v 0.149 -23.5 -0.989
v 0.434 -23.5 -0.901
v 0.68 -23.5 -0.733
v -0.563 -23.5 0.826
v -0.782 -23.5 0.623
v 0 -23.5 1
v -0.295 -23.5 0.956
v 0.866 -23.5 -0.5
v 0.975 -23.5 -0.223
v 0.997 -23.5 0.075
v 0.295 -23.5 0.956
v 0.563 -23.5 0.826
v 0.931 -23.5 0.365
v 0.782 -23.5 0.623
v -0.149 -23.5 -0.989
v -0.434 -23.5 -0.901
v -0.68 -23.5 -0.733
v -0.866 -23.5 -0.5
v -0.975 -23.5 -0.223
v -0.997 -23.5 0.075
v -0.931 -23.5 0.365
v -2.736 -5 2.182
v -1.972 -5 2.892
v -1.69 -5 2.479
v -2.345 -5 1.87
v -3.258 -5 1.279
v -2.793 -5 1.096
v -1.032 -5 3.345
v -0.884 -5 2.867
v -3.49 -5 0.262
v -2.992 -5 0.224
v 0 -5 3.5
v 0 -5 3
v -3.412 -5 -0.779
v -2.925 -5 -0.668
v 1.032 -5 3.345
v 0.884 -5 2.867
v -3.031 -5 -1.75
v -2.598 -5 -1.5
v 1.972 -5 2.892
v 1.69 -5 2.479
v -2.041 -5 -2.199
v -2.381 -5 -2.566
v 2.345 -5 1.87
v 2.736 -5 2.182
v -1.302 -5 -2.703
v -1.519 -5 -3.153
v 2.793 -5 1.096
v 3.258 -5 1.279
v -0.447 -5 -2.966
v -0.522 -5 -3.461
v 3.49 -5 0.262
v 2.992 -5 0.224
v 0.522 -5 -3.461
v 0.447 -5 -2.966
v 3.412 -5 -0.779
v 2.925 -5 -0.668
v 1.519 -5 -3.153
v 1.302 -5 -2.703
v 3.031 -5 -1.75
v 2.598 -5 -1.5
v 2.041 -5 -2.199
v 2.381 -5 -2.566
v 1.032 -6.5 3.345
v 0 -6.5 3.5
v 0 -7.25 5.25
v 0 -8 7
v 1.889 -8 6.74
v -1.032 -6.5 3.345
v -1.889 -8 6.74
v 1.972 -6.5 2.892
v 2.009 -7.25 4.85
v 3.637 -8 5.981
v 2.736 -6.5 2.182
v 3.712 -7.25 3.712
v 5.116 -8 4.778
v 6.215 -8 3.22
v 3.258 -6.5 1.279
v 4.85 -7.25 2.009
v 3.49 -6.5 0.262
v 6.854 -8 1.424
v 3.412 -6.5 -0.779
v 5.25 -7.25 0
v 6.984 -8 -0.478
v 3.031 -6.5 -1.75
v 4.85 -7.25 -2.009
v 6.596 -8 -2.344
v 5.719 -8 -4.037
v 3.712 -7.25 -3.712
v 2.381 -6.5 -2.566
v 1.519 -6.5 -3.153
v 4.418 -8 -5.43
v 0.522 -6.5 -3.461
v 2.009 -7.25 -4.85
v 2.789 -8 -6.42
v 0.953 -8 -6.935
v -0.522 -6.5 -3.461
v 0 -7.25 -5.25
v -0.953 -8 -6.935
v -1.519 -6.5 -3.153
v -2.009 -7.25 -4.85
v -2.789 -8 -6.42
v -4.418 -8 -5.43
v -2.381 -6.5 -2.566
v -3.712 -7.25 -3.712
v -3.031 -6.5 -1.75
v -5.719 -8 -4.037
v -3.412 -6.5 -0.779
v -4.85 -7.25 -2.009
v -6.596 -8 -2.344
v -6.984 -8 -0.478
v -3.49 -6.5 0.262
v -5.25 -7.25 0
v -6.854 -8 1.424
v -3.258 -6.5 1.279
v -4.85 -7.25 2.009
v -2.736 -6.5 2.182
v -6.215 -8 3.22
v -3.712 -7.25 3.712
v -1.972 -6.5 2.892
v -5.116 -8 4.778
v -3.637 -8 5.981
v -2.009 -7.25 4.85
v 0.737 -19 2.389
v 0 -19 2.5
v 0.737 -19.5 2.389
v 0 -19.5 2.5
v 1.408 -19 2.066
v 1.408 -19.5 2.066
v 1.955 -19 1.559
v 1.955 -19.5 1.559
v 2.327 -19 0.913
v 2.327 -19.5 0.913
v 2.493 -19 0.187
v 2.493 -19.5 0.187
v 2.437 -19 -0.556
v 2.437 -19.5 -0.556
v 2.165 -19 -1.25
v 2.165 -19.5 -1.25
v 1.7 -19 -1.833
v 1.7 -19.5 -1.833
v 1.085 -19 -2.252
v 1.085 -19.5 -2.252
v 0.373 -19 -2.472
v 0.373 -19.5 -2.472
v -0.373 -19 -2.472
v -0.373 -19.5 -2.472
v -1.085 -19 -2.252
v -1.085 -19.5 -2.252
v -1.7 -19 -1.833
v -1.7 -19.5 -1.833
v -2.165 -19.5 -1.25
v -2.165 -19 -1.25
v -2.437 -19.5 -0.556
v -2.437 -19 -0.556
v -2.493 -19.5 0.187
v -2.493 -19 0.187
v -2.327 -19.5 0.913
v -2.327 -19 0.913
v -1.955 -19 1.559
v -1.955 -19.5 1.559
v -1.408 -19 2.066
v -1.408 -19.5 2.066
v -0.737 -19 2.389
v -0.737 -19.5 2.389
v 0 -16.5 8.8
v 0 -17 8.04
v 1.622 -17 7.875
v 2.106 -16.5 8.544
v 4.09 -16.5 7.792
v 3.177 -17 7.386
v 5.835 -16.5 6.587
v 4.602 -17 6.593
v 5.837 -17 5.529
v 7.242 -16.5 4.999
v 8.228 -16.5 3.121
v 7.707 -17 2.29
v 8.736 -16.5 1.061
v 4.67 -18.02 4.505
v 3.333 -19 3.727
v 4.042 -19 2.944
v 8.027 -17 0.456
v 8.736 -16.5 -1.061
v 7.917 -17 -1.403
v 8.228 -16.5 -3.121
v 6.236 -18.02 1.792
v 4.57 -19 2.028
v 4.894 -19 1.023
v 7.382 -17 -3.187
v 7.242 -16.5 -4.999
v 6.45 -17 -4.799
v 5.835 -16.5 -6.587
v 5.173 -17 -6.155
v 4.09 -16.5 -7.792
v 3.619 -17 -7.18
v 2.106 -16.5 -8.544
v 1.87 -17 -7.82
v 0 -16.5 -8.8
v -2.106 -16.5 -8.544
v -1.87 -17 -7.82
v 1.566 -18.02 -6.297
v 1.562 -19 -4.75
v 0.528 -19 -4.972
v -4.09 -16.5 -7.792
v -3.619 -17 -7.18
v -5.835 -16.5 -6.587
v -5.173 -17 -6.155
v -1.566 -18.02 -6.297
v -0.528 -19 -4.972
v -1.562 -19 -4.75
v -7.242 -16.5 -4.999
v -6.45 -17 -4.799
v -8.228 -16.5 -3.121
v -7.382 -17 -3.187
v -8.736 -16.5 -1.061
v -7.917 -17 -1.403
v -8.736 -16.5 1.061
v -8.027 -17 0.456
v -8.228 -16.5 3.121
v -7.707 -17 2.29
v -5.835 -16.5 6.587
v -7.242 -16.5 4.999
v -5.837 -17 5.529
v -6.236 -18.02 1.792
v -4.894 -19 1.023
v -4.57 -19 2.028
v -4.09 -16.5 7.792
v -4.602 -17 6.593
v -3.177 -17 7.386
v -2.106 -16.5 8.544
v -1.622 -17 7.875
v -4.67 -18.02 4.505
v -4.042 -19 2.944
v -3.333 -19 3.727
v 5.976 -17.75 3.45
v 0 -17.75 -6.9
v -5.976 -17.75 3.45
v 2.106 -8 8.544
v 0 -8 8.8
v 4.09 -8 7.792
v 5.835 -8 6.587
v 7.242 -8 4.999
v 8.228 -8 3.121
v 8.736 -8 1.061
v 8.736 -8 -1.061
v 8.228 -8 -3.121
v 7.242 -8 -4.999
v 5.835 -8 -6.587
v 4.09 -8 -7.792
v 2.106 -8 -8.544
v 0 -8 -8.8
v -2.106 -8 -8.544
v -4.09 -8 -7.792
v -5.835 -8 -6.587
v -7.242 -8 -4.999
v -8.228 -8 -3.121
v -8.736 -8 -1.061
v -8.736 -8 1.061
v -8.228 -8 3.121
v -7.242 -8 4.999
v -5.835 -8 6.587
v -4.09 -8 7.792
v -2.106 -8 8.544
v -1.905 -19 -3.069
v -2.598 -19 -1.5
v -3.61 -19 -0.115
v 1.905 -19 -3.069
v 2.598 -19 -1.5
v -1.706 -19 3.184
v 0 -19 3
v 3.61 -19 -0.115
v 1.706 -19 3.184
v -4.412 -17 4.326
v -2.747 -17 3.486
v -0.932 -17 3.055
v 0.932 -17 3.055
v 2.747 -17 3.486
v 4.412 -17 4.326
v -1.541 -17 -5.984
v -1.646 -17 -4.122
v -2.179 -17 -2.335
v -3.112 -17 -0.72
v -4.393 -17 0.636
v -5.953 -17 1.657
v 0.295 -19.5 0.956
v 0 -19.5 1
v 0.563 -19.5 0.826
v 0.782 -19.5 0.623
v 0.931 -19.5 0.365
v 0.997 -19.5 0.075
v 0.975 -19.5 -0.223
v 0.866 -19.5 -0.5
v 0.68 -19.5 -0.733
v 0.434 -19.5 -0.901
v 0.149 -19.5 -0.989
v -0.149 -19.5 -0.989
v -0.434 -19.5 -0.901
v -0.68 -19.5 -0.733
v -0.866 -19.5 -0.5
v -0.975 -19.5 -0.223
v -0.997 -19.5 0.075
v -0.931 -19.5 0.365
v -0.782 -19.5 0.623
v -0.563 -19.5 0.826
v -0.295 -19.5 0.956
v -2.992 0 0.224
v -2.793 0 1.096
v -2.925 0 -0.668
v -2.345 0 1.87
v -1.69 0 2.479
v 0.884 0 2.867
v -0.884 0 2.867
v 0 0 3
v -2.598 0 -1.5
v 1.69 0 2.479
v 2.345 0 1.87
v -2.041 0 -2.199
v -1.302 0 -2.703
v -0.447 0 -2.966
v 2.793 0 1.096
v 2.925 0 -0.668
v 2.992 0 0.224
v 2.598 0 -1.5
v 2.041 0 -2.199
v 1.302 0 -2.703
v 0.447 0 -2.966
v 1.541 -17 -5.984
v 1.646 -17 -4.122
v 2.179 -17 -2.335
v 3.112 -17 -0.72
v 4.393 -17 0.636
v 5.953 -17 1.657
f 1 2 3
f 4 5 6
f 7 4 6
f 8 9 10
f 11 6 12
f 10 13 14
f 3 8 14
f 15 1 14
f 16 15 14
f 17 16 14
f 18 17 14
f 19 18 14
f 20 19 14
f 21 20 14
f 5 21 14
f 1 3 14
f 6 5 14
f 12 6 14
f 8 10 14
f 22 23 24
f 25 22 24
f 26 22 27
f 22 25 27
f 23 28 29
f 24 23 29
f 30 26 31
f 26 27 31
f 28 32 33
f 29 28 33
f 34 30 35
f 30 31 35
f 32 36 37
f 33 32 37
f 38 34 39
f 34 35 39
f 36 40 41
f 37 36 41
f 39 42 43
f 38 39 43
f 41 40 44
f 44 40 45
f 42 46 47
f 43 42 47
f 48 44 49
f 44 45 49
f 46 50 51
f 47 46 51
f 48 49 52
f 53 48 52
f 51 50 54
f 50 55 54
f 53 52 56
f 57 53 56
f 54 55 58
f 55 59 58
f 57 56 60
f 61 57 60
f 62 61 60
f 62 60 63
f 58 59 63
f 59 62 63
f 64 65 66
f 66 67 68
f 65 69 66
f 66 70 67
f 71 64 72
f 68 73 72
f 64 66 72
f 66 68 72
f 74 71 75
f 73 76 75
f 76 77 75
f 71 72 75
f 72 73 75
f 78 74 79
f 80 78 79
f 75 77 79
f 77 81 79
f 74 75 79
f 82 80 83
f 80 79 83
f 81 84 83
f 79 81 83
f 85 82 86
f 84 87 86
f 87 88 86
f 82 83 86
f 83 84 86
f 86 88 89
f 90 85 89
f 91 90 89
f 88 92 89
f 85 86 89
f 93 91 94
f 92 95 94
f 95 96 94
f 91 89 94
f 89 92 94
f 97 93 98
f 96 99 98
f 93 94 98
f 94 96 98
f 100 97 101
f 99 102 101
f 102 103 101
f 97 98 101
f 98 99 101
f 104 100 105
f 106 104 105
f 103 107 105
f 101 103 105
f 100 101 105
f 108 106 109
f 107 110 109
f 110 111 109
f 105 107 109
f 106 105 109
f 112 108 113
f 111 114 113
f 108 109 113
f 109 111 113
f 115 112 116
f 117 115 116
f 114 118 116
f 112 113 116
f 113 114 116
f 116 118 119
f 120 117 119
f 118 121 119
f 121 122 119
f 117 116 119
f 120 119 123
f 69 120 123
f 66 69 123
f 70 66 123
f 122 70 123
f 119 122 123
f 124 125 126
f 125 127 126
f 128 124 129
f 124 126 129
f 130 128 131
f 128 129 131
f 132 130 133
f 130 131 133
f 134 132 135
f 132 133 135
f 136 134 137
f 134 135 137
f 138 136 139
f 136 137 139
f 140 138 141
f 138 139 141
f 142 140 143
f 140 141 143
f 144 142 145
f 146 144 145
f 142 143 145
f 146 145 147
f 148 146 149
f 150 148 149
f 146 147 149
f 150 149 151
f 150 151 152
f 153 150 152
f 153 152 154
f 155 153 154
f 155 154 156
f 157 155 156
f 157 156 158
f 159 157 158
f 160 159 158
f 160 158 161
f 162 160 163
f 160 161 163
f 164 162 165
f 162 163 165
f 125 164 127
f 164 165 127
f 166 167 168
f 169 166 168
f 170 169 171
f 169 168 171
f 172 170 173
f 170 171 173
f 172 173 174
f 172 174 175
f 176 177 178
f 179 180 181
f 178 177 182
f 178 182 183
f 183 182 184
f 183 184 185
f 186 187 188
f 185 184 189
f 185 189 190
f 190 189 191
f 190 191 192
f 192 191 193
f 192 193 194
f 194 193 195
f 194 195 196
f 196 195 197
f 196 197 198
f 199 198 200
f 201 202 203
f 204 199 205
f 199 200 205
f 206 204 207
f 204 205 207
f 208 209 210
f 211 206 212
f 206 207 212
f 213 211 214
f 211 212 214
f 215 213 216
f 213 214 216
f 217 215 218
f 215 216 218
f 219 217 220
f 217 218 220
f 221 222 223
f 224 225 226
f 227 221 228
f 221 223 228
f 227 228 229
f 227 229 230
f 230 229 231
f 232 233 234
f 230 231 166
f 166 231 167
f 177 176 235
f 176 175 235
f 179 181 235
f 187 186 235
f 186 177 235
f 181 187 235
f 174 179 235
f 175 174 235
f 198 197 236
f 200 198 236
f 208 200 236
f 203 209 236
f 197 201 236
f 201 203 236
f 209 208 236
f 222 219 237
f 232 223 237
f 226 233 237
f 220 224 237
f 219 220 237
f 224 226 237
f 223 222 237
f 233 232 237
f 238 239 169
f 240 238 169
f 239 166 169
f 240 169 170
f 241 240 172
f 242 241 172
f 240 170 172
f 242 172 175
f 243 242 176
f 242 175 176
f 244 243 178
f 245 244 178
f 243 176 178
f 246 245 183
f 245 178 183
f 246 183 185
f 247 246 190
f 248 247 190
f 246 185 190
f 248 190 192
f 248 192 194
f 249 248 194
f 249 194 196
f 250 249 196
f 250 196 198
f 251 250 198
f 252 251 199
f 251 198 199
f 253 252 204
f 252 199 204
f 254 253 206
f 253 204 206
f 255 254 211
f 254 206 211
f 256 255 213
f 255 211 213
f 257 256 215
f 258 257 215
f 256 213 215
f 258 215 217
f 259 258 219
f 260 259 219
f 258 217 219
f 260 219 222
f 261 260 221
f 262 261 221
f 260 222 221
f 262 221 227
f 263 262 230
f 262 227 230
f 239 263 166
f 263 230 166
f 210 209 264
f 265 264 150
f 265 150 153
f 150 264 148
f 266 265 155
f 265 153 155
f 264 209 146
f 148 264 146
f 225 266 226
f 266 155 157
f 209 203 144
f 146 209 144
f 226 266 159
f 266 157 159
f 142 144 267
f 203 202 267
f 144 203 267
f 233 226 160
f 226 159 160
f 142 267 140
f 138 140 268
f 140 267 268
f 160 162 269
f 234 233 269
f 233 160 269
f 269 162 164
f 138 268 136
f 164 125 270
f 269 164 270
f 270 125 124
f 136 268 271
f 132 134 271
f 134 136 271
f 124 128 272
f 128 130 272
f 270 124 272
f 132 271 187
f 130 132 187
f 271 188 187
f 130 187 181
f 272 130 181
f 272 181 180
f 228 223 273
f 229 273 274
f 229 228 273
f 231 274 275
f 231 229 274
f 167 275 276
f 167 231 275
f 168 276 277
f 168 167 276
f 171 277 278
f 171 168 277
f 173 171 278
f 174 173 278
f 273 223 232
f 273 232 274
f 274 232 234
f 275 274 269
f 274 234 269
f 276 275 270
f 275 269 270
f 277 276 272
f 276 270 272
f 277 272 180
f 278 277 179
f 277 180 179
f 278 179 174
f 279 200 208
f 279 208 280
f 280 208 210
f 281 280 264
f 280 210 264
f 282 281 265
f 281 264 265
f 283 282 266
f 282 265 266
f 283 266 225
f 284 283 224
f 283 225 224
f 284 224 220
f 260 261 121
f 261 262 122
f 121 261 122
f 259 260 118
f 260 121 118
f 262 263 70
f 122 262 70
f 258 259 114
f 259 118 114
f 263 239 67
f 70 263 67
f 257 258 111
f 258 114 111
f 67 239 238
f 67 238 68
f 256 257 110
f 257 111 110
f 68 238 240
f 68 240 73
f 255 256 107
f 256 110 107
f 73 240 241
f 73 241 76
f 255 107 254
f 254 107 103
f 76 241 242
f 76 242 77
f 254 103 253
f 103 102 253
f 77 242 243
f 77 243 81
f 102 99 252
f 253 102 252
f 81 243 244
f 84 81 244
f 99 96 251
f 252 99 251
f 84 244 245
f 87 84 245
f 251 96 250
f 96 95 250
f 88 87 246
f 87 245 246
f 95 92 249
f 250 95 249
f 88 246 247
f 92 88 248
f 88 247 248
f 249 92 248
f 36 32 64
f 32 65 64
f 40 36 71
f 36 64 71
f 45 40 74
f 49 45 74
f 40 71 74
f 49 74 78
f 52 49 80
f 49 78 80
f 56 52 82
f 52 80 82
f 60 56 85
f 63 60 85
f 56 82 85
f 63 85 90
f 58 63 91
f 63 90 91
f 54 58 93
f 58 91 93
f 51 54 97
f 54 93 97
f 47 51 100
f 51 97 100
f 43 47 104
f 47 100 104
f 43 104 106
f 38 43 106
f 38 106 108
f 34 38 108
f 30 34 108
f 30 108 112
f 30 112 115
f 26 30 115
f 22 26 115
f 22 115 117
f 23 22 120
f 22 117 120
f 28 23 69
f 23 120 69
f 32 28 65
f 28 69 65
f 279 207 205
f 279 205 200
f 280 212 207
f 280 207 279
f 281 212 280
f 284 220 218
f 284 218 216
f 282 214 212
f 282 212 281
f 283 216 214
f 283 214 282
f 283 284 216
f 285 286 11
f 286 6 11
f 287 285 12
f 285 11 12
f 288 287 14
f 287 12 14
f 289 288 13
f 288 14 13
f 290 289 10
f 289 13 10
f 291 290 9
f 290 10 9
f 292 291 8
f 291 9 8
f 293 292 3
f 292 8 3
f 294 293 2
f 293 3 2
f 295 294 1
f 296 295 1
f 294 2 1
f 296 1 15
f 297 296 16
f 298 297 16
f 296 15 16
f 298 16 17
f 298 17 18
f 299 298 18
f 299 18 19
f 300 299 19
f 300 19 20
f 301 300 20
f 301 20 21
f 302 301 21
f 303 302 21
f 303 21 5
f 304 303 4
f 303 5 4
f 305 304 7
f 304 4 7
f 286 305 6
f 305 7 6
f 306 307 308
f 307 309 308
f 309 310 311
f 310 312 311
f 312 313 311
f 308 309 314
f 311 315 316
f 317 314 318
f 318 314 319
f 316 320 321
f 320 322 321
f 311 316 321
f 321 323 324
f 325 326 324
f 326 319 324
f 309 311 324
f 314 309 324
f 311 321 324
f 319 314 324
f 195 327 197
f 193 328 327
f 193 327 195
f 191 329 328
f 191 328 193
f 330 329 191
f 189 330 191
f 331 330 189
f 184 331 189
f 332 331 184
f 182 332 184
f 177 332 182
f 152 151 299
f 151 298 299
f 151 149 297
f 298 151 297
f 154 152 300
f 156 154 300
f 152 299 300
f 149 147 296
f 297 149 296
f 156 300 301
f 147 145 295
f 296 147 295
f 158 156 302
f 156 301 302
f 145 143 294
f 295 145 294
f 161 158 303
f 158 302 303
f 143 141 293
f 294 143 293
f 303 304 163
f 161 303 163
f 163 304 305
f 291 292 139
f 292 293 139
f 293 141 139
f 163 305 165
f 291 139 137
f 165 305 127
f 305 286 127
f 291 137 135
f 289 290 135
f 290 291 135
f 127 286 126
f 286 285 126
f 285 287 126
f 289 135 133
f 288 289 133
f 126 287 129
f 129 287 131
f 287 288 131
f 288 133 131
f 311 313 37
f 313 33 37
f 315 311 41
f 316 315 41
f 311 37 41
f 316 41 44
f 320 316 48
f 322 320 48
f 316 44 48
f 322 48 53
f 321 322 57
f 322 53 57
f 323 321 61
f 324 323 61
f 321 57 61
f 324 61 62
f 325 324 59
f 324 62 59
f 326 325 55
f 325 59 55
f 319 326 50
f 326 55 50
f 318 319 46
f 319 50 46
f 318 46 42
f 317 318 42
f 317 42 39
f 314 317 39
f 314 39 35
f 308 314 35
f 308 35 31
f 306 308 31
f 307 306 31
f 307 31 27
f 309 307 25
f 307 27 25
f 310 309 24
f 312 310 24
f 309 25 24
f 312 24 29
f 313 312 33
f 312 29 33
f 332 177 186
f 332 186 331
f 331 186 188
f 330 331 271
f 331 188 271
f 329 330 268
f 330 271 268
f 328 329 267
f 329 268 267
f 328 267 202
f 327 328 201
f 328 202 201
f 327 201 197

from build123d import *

# Parameters (mm, degrees)
F2_R     = 8
F3_DEPTH = 2


with BuildPart() as f1:
    # F0 (on Right) → F1 (revolve)
    with BuildSketch(Plane.YZ):
        Polygon((-23.5, 0), (0, 0), (0, 3), (-5, 3), (-5, 3.5), (-6.5, 3.5), (-8, 7), (-8, 8.8), (-16.5, 8.8), (-19, 5), (-19, 2.5), (-19.5, 2.5), (-19.5, 1), (-23.5, 1), align=None)
    revolve(axis=Axis((0, -11.75, 0), (0, 1, 0)))

    # F2 (on face) → F3 (cut)
    with BuildSketch(Plane.XZ.offset(19)):
        with Locations((0, 11)):
            Circle(F2_R)
        with Locations((-9.526279, -5.5)):
            Circle(F2_R)
        with Locations((9.526279, -5.5)):
            Circle(F2_R)
    extrude(amount=-F3_DEPTH, mode=Mode.SUBTRACT)


solid = f1.part
